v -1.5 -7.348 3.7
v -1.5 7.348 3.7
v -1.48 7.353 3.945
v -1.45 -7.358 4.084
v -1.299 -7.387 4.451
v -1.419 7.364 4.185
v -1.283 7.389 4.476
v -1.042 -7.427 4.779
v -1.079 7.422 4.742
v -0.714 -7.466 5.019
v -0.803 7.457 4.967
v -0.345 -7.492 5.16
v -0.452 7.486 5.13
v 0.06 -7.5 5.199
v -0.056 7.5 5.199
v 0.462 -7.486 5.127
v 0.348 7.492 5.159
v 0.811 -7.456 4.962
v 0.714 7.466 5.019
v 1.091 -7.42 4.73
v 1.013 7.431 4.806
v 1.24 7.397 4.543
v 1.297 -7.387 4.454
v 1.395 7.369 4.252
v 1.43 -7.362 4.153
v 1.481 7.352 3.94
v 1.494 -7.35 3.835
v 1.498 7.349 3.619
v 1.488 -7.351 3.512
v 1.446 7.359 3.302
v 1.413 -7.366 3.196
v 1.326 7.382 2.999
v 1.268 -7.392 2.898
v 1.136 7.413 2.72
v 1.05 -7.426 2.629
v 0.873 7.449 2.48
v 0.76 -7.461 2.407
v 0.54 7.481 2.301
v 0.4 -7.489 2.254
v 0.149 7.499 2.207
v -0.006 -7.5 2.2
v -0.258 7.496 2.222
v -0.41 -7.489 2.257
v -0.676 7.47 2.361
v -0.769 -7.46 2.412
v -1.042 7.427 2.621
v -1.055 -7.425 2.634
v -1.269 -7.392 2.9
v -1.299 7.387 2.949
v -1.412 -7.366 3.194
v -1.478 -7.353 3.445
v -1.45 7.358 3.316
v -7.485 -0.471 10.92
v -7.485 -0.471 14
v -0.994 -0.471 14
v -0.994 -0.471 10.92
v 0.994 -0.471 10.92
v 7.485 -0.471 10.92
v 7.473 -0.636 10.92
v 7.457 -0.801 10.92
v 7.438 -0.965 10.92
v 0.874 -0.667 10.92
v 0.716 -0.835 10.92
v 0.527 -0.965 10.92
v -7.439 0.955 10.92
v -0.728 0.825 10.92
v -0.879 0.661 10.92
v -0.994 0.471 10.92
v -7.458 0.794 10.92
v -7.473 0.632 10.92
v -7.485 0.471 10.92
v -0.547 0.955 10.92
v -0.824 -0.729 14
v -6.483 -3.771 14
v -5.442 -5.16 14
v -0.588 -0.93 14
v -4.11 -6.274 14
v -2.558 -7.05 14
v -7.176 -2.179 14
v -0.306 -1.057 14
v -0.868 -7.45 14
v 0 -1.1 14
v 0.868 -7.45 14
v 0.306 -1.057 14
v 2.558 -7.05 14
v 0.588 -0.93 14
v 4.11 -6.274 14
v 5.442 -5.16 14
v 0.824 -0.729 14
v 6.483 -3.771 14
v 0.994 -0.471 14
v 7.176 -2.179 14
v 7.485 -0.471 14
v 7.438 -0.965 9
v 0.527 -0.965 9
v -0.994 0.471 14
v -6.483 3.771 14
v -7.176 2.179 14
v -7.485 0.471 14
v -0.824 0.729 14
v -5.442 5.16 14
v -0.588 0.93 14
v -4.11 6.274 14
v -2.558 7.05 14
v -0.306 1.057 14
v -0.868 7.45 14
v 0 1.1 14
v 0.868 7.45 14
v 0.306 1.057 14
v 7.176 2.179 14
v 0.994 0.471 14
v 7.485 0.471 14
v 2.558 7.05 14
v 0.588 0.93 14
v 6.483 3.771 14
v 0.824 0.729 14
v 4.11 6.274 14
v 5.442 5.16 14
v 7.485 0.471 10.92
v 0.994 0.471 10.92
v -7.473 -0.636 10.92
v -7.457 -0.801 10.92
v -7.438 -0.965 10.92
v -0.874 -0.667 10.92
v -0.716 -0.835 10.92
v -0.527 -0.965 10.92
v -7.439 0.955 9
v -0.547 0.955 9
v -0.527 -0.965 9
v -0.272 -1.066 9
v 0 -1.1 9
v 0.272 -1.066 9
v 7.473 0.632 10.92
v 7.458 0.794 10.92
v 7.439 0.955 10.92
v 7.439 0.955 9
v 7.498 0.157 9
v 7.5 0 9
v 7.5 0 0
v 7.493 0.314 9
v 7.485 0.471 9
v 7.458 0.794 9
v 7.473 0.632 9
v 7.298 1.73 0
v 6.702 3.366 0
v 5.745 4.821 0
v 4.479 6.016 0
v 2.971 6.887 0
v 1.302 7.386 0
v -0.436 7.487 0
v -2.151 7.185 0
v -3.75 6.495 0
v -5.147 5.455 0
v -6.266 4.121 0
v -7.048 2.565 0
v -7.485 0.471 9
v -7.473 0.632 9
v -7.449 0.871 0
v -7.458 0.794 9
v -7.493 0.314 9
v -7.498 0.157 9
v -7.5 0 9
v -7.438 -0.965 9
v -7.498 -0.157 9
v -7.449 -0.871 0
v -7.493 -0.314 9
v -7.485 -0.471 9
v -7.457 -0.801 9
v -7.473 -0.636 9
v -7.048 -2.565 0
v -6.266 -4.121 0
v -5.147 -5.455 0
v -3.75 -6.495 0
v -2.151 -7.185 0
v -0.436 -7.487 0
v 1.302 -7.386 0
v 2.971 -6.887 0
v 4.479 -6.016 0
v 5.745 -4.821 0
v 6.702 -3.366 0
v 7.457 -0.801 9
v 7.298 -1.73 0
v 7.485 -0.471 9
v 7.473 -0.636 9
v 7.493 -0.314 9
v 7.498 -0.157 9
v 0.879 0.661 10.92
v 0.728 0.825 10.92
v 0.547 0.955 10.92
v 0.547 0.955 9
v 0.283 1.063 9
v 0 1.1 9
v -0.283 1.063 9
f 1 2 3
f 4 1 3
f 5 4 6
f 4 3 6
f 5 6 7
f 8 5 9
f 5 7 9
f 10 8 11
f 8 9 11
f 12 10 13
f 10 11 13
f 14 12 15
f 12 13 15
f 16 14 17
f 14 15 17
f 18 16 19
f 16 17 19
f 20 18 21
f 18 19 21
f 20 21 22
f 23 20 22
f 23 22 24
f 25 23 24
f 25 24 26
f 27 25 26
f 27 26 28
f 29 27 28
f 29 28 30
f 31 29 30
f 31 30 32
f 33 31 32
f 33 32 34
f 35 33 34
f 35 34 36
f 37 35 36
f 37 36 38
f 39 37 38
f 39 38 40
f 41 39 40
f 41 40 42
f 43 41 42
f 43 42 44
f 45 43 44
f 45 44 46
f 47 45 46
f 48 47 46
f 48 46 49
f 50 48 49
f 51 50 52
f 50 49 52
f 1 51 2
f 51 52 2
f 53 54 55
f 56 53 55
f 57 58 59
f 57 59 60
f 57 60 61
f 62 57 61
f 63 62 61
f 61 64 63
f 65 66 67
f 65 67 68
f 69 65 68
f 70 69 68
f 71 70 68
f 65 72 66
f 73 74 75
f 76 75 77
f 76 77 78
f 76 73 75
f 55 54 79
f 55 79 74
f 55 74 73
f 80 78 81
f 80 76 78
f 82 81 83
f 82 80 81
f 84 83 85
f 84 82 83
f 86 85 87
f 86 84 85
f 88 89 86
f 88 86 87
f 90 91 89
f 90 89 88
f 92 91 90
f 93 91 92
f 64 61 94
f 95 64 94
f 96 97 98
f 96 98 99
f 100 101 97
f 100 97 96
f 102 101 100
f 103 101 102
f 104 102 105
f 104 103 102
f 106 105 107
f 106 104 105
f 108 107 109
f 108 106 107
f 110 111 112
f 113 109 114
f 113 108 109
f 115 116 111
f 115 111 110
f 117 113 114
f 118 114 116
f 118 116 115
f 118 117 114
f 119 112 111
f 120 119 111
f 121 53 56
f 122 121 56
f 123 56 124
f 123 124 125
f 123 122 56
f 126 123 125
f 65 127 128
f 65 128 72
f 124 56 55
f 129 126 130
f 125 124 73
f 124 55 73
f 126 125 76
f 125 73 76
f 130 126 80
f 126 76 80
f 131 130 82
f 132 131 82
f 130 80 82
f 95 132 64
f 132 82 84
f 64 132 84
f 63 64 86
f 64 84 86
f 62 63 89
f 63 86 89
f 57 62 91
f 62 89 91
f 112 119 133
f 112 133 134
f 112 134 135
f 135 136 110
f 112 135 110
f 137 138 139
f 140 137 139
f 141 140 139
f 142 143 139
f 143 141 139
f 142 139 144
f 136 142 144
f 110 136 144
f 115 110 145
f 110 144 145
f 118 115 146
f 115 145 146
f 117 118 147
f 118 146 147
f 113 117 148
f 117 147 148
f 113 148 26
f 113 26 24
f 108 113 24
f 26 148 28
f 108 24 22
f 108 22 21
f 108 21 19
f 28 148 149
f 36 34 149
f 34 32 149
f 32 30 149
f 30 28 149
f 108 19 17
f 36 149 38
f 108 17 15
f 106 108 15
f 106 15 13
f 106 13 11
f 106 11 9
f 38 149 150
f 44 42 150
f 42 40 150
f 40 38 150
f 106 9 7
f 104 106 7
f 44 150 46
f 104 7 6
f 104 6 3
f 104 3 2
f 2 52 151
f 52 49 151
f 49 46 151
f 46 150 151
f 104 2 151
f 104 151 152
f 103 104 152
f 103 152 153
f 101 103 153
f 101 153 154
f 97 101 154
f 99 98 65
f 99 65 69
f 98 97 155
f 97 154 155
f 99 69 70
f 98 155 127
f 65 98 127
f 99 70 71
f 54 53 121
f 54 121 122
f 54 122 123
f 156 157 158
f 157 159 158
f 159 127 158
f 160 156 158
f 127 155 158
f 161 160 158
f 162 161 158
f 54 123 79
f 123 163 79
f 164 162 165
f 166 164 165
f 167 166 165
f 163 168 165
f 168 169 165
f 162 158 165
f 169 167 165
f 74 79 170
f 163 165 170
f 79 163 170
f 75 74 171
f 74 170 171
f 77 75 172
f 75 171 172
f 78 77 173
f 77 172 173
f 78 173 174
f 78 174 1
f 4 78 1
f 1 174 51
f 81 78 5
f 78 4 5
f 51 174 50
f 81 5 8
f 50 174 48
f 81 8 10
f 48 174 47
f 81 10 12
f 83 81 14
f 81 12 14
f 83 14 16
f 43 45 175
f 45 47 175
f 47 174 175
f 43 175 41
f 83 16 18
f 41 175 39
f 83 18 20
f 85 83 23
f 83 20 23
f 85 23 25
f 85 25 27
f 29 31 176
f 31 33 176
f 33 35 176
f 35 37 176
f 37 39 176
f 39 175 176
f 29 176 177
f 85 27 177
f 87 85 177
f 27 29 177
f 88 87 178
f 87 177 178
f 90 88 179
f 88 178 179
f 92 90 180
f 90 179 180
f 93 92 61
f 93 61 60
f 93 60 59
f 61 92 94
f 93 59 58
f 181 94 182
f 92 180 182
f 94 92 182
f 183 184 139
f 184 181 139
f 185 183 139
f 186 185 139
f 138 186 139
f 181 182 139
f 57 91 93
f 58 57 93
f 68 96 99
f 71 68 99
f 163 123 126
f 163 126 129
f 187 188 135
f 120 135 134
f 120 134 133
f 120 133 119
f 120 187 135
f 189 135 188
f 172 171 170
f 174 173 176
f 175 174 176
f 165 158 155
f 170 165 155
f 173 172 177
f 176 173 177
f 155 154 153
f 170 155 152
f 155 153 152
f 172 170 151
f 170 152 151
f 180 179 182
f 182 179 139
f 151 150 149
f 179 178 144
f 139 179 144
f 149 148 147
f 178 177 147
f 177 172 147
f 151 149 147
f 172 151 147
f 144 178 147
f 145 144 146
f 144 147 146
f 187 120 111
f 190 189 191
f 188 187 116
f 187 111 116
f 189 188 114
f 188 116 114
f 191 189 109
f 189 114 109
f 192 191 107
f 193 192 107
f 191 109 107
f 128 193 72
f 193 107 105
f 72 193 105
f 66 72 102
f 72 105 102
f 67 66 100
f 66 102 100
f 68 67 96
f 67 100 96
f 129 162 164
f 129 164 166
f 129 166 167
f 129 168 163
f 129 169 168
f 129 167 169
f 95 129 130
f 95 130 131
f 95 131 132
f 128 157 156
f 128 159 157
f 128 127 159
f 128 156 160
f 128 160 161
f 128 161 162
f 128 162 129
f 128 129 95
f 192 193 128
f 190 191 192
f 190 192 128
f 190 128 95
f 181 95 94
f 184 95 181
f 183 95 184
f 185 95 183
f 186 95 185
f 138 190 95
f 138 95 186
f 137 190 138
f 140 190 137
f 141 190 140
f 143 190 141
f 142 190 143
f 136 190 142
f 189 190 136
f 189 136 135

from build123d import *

# Parameters (mm, degrees)
F0_R      = 7.5
F1_DEPTH  = 14
F4_R      = 1.5
F5_DEPTH  = 15.001
F6_R      = 1.1
F7_DEPTH  = 5
F9_DEPTH  = 5
F13_DEPTH = 15.0010001


with BuildPart() as f1:
    # F0 (on Top) → F1 (new body)
    with BuildSketch(Plane.XY):
        Circle(F0_R)
    extrude(amount=F1_DEPTH)

    # F4 (on line) → F5 (cut, through all)
    with BuildSketch(Plane(origin=(0, 7.5, 0), x_dir=(-1, 0, 0), z_dir=(0, 1, 0))):
        with Locations((0, 3.7)):
            Circle(F4_R)
    extrude(amount=-F5_DEPTH, mode=Mode.SUBTRACT)

    # F6 (on face) → F7 (cut)
    with BuildSketch(Plane.XY.offset(14)):
        Circle(F6_R)
    extrude(amount=-F7_DEPTH, mode=Mode.SUBTRACT)

    # F8 (on face) → F9 (cut, through all)
    with BuildSketch(Plane.XY.offset(14)):
        with BuildLine():
            ThreePointArc((-7.5, 0), (-7.4962990893, -0.2355843037), (-7.4852000096, -0.470936107))
            Line((-7.4852000096, -0.470936107), (-0.9940921402, -0.470936107))
            ThreePointArc((-0.9940921402, -0.470936107), (-1.1, 0), (-0.9940921402, 0.470936107))
            Line((-0.9940921402, 0.470936107), (-7.4852000096, 0.470936107))
            ThreePointArc((-7.4852000096, 0.470936107), (-7.4962990893, 0.2355843037), (-7.5, 0))
        make_face()
        with BuildLine():
            Line((0.9940921402, -0.470936107), (7.4852000096, -0.470936107))
            ThreePointArc((7.4852000096, -0.470936107), (7.4962990893, -0.2355843037), (7.5, 0))
            ThreePointArc((7.5, 0), (7.4962990893, 0.2355843037), (7.4852000096, 0.470936107))
            Line((7.4852000096, 0.470936107), (0.9940921402, 0.470936107))
            ThreePointArc((0.9940921402, 0.470936107), (1.0731964765, 0.241348965), (1.1, 0))
            ThreePointArc((1.1, 0), (1.0731964765, -0.241348965), (0.9940921402, -0.470936107))
        make_face()
    extrude(amount=-F9_DEPTH, mode=Mode.SUBTRACT)

    # F12 (on line) → F13 (cut, through all)
    with BuildSketch(Plane.YZ.offset(-7.5)):
        Polygon((-0.9654102032, 9), (-0.470936107, 9), (0.470936107, 9), (0.9545897968, 9), (0.9545897968, 10.92), (-0.9654102032, 10.92), align=None)
    extrude(amount=F13_DEPTH, mode=Mode.SUBTRACT)


solid = f1.part
